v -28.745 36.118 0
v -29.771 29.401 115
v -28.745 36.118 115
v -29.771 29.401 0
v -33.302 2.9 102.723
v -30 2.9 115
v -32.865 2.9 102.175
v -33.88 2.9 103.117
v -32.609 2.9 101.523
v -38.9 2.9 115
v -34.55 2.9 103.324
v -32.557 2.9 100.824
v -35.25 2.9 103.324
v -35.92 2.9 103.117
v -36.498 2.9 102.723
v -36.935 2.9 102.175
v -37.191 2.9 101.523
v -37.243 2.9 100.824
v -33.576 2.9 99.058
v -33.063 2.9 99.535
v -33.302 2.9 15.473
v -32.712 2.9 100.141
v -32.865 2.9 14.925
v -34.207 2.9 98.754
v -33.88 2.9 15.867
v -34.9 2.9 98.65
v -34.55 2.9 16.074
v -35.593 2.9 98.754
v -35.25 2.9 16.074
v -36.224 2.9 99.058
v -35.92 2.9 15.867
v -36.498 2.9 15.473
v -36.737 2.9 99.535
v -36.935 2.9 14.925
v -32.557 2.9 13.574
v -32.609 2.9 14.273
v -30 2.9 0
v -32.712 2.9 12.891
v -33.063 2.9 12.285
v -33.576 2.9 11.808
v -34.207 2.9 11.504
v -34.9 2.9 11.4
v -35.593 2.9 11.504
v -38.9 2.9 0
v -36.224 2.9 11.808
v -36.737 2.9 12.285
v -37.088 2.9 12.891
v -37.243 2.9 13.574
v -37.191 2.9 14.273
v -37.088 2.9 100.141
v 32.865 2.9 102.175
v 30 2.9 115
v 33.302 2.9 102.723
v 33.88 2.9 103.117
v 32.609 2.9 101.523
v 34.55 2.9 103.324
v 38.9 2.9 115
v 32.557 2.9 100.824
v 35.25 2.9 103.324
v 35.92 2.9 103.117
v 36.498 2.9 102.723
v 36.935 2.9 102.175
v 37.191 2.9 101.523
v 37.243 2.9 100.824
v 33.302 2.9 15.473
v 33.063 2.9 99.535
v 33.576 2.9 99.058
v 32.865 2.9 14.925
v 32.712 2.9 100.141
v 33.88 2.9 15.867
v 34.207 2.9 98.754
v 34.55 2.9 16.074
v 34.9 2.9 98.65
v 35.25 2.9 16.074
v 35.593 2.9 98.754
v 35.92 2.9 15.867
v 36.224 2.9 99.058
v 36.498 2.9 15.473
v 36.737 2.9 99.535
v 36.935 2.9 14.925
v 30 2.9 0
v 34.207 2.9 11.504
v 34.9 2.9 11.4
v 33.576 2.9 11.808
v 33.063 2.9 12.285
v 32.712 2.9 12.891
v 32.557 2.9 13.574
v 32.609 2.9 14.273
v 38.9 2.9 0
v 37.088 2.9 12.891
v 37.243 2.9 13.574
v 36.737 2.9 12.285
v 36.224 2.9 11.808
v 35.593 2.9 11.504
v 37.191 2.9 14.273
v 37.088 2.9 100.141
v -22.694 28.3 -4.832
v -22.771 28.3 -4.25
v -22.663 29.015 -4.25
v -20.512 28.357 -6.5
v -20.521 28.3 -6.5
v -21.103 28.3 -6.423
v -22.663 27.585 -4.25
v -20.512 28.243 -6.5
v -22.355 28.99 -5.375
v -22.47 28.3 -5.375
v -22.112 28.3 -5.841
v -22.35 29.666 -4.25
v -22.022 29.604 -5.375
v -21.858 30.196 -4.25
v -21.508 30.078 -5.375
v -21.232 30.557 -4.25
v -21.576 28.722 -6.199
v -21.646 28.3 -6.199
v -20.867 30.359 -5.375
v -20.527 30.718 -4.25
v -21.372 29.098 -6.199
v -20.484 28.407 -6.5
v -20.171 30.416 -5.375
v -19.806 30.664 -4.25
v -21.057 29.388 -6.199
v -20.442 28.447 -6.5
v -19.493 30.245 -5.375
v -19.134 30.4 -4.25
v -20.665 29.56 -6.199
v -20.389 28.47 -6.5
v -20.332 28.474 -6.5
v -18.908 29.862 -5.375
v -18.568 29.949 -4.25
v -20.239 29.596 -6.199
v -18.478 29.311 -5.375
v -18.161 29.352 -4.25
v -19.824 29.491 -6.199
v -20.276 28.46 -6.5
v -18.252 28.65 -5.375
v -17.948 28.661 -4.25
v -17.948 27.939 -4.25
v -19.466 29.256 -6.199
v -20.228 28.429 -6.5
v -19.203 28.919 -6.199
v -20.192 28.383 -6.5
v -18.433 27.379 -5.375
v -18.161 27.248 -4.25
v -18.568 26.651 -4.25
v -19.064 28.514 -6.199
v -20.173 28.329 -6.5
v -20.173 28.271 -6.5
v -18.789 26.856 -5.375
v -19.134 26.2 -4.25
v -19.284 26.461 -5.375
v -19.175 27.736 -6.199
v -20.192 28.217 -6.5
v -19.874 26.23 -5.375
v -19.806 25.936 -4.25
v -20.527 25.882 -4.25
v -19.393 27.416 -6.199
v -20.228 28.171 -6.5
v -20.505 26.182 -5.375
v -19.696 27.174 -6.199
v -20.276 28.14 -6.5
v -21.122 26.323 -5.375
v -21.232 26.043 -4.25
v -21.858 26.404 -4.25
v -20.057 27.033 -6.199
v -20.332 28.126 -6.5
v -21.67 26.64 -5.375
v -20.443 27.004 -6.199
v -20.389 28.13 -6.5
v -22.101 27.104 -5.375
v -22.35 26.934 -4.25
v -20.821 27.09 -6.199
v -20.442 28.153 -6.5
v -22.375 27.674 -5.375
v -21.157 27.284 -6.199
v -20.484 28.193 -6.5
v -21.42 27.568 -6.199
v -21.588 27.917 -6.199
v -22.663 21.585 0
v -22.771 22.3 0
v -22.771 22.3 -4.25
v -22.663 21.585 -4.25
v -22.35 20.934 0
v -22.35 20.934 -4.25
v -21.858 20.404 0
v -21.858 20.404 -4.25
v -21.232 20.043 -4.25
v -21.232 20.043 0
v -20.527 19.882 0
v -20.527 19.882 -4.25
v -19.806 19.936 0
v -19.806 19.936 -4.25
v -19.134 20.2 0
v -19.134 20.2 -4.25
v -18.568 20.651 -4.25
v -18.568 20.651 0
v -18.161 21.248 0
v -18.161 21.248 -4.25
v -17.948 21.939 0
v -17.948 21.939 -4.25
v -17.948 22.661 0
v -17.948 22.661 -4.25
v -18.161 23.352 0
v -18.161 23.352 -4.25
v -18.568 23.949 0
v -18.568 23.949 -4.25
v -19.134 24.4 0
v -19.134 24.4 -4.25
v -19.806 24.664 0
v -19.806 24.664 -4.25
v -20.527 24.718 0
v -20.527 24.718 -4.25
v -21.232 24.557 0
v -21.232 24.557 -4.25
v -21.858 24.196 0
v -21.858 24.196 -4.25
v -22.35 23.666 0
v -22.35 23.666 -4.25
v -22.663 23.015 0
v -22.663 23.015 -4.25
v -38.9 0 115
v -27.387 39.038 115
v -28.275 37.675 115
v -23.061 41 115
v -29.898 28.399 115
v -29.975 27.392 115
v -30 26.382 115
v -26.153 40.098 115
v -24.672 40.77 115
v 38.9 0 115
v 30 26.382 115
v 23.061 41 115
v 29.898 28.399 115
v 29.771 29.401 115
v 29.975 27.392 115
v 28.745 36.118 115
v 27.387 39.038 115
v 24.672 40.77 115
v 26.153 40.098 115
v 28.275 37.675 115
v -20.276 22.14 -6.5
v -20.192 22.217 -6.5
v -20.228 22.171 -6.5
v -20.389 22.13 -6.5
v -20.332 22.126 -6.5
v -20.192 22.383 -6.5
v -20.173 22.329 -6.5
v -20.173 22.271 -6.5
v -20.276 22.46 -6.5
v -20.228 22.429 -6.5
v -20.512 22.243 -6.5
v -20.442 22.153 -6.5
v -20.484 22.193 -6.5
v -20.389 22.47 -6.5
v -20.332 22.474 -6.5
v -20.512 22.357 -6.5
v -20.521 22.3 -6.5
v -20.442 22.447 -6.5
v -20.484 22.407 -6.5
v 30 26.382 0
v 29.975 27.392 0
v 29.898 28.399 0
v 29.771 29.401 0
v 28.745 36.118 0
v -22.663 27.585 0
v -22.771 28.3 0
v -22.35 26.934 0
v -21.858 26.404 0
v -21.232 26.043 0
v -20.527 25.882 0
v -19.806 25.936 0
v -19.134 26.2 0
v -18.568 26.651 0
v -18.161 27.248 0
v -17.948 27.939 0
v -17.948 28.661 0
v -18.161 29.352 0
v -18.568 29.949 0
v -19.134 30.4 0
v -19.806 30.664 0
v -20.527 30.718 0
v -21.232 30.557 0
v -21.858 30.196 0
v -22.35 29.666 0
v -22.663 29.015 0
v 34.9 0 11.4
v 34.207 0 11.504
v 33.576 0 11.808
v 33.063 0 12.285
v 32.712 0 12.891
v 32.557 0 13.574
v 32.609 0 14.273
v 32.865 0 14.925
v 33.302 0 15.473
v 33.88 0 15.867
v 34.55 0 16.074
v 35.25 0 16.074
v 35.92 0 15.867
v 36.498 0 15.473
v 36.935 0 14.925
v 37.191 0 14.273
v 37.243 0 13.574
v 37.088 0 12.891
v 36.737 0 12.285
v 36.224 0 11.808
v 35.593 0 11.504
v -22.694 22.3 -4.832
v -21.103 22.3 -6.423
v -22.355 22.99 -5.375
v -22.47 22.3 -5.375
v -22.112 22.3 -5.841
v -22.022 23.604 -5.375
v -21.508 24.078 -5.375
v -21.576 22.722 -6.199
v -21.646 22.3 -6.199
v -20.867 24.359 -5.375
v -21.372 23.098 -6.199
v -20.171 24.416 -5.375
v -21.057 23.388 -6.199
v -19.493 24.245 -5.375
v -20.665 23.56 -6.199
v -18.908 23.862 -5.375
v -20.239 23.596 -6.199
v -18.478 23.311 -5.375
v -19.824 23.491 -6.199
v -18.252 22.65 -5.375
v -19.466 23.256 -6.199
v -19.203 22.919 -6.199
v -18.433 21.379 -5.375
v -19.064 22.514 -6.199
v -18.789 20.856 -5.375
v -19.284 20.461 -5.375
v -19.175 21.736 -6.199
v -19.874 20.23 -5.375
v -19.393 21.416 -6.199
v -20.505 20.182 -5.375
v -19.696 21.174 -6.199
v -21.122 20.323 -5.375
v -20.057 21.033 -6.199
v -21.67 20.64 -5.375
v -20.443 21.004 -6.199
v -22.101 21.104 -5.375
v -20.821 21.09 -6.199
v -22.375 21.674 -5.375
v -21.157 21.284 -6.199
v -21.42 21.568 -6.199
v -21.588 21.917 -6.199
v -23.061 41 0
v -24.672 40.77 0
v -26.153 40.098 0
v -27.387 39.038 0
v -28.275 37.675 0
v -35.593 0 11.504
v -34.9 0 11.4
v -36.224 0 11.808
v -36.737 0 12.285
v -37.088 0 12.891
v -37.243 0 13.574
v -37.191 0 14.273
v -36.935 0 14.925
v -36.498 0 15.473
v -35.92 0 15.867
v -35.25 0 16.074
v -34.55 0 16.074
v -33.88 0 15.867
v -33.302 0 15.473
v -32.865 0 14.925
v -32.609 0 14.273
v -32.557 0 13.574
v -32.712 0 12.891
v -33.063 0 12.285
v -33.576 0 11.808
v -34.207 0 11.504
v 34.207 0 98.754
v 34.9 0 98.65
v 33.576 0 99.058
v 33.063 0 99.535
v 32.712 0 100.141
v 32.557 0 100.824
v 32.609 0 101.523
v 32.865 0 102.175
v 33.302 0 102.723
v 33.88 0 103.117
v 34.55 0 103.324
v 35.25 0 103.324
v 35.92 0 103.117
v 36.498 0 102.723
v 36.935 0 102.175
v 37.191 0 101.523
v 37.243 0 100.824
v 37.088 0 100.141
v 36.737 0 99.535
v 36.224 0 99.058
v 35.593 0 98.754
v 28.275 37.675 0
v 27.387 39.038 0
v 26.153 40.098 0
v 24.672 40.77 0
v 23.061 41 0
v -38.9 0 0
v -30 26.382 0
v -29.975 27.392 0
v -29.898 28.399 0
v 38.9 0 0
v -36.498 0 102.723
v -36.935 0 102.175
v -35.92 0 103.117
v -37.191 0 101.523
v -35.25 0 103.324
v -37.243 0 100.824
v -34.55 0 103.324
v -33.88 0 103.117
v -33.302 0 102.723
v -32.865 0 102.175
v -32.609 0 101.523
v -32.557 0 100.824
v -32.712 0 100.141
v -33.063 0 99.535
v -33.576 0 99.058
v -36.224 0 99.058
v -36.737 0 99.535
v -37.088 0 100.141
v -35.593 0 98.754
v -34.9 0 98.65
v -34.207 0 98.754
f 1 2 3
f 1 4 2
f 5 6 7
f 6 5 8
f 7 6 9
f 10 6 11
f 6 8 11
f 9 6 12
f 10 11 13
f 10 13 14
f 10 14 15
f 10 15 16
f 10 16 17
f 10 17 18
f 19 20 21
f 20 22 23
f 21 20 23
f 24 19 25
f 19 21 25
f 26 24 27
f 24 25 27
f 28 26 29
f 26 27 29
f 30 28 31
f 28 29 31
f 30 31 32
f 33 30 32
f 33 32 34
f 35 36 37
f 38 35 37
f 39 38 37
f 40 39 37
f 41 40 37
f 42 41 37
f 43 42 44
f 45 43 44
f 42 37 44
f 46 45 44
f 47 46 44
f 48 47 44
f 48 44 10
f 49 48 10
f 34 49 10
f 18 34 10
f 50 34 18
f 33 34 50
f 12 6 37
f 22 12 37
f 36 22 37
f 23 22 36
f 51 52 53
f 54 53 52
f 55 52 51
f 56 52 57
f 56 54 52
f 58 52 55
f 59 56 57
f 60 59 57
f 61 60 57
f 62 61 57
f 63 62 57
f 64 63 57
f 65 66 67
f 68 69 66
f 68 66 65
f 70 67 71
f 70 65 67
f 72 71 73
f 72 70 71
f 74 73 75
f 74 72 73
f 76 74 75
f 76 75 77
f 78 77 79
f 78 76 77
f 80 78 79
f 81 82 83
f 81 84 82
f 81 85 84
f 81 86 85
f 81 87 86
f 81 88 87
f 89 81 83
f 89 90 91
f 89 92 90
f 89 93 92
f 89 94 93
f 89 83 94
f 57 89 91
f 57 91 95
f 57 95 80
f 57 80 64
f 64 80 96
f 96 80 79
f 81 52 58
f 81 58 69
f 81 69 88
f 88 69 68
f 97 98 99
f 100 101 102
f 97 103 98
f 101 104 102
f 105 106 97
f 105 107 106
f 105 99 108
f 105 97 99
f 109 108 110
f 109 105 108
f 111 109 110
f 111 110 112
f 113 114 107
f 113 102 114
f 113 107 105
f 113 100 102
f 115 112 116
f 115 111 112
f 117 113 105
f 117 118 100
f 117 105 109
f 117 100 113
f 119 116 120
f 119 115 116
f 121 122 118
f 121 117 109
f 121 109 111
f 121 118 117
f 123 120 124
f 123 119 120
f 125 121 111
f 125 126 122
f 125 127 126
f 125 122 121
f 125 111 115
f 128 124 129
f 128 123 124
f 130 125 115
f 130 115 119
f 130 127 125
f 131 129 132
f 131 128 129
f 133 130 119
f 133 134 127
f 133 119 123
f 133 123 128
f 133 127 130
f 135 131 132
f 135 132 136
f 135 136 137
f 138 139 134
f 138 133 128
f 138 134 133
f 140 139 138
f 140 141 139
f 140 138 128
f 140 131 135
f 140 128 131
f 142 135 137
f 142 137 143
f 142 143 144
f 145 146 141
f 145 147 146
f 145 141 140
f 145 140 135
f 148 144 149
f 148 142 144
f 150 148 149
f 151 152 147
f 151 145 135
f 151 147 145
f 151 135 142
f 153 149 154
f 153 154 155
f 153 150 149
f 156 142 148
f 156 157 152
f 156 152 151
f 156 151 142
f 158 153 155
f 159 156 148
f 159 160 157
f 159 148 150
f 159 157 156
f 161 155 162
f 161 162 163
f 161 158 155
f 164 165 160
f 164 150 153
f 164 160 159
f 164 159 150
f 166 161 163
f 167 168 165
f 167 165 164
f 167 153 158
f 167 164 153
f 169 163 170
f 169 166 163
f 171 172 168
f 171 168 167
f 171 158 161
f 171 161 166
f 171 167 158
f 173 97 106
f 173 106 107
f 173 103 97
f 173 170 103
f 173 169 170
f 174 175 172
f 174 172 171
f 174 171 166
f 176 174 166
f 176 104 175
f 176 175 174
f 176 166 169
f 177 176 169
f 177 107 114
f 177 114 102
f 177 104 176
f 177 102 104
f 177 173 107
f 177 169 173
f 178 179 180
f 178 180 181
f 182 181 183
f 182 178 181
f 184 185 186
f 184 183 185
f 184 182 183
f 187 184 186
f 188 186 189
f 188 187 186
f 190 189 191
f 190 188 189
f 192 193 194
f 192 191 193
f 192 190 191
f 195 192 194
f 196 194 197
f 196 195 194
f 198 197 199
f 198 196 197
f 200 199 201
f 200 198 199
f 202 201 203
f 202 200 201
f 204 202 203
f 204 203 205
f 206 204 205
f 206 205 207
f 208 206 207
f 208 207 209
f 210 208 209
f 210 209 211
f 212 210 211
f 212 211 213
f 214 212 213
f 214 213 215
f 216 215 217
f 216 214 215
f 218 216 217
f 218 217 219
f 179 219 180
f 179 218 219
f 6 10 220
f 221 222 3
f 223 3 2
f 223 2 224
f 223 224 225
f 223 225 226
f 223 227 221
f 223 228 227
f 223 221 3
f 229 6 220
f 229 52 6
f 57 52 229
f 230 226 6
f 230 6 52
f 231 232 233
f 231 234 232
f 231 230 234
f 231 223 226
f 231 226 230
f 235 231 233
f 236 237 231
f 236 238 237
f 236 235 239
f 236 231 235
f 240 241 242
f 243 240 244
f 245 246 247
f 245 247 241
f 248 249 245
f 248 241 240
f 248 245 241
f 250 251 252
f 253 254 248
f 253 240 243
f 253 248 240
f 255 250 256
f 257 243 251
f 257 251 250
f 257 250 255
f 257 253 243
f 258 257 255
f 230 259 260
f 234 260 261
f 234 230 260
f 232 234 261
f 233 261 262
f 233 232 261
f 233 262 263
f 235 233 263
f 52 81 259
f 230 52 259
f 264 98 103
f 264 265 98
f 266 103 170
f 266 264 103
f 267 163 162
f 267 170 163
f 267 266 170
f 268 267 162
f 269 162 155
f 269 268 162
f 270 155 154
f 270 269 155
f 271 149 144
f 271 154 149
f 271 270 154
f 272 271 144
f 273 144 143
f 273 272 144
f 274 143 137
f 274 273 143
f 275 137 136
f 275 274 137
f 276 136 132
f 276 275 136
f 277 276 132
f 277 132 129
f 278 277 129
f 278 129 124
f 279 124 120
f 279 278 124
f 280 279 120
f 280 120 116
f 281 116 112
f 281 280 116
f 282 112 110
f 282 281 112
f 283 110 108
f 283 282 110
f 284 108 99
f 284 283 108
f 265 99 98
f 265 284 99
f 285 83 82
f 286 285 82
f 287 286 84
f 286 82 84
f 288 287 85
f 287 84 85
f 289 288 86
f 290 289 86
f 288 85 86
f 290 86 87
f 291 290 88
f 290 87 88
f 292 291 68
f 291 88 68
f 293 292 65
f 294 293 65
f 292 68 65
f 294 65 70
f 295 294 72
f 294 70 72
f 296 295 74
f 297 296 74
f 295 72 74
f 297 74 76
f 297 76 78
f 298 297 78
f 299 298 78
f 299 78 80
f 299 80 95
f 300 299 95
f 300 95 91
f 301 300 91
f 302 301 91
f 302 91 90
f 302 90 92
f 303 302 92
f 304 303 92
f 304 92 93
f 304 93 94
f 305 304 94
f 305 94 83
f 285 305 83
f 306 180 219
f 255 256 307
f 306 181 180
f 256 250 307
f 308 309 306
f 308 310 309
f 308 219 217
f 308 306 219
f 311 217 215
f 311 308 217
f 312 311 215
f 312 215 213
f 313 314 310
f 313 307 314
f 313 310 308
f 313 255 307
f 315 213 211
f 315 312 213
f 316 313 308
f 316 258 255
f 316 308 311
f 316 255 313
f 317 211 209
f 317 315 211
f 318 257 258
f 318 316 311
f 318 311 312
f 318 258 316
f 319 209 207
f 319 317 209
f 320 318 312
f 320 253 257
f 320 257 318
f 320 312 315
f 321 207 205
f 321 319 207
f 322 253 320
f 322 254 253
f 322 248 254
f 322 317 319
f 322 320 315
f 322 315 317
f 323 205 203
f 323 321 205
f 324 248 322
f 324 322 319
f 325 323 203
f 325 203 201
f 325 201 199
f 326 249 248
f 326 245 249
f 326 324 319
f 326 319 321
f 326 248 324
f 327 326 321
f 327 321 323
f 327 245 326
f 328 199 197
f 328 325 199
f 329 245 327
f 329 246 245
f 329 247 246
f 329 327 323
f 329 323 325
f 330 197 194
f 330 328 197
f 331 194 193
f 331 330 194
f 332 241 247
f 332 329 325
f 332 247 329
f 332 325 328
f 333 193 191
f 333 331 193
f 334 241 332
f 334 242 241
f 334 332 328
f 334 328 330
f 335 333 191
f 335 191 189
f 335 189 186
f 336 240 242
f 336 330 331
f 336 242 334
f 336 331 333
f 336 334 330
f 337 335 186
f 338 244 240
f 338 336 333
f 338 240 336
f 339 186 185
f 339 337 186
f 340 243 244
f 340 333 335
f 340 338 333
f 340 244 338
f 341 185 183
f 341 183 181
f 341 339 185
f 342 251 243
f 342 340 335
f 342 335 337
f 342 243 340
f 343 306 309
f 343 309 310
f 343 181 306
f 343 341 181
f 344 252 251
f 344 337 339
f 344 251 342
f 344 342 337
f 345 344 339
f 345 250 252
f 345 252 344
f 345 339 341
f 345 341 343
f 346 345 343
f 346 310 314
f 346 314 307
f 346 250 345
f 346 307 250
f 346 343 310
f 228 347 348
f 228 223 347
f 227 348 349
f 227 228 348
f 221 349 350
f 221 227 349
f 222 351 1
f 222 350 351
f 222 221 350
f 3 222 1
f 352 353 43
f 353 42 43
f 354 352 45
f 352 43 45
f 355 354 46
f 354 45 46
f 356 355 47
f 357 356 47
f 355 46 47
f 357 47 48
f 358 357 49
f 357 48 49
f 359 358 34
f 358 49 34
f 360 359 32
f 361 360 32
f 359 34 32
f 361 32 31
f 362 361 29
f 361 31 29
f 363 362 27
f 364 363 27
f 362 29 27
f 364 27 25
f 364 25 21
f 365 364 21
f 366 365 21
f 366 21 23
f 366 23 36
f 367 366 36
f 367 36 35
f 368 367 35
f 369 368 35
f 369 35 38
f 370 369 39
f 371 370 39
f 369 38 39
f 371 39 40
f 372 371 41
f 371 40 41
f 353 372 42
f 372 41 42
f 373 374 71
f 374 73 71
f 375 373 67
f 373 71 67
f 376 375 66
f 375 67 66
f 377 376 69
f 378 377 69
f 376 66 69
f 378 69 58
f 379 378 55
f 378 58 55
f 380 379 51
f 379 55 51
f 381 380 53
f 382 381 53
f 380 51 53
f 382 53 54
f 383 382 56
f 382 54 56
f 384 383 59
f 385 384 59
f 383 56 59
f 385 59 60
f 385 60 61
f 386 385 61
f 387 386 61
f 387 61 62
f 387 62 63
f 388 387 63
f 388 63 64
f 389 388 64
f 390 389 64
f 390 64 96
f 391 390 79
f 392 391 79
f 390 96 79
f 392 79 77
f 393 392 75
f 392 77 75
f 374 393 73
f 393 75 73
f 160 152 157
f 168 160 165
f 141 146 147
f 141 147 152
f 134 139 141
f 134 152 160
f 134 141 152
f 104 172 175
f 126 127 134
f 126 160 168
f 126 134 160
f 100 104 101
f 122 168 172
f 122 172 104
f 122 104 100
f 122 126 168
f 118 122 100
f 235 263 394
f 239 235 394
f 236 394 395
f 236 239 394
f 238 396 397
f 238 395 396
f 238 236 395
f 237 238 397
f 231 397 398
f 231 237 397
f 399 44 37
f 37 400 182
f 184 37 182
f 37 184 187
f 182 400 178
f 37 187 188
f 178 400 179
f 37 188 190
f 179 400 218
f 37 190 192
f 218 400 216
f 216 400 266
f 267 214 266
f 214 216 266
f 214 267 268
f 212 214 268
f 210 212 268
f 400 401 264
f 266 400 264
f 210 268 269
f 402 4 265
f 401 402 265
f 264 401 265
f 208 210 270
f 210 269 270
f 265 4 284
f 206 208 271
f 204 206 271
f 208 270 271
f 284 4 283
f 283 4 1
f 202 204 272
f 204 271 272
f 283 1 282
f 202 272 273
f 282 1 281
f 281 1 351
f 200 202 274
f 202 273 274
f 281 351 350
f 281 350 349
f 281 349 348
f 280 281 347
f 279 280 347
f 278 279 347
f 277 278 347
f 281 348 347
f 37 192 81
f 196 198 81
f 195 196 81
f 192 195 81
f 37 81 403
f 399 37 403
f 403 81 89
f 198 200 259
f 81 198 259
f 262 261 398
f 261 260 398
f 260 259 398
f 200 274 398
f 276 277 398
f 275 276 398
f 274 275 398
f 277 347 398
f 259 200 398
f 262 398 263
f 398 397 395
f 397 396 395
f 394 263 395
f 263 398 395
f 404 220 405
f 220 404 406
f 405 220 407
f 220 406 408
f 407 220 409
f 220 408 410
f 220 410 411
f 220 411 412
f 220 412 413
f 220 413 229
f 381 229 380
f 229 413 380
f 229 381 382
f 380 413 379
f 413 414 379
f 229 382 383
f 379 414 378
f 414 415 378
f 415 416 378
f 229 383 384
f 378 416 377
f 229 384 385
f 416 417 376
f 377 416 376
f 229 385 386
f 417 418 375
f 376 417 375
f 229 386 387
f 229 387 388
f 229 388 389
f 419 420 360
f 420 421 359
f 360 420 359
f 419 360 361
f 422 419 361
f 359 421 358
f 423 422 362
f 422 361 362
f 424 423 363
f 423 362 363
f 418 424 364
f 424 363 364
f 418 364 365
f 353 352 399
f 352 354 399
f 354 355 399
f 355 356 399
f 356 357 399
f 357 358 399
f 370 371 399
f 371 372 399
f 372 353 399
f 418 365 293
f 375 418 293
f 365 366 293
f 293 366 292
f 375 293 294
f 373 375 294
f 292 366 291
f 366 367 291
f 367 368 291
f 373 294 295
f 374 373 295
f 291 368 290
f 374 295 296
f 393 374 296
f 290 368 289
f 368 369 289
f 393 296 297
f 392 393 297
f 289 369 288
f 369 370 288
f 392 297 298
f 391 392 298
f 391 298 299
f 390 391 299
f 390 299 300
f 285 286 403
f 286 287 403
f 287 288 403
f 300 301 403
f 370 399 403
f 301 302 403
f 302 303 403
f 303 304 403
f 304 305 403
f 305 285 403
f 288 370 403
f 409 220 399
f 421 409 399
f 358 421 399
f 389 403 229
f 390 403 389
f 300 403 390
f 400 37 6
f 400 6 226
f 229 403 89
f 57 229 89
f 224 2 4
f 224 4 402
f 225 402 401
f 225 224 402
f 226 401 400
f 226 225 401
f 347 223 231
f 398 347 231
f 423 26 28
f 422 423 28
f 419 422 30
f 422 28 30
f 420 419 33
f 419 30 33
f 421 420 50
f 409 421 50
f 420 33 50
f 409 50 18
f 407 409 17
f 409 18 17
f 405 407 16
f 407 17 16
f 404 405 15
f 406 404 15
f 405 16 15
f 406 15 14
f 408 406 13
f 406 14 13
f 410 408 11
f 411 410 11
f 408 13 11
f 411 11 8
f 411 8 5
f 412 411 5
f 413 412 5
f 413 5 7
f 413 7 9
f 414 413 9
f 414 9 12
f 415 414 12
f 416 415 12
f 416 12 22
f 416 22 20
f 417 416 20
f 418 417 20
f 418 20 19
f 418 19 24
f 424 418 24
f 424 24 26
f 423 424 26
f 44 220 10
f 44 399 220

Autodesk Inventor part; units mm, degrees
ref_plane "YZ Plane" through (0, 0, 0) normal (1, 0, 0) x (0, 1, 0)
ref_plane "XZ Plane" through (0, 0, 0) normal (0, 1, 0) x (-1, 0, 0)
ref_plane "XY Plane" through (0, 0, 0) normal (0, 0, 1) x (1, 0, 0)
sketch "Sketch1" plane through (0, 0, 0) normal (0, 0, 1) x (1, 0, 0)
  line L0 (-38.9, 0) -> (38.9, 0)
  line L1 (-38.9, 0) -> (-38.9, 2.9)
  line L2 (38.9, 0) -> (38.9, 2.9)
  line L3 (-30, 2.9) -> (-38.9, 2.9)
  line L4 (30, 2.9) -> (38.9, 2.9)
  line L5 (30, 2.9) -> (30, 27.9)
  line L6 (-30, 2.9) -> (-30, 27.9)
  line L7 (-30, 27.9) -> (30, 27.9) construction
  line L8 (-28, 41) -> (28, 41)
  line L9 (-30, 27.9) -> (-28, 41)
  line L10 (30, 27.9) -> (28, 41)
  point P0 (0, 0)
  point P1 (0, 0)
  point P2 (0, 27.9)
  point P3 (0, 41)
  dimension "d0" = 77.8
  dimension "d1" = 2.9
  dimension "d6" = 25
  dimension "d7" = 56
  dimension "d8" = 41
extrude "Extrusion1" add sketch "Sketch1" along normal blind 115
fillet "Fillet1" radius 5.75 2 edges at (28, 41, 57.5) (-28, 41, 57.5)
fillet "Fillet2" radius 20 2 edges at (-30, 27.9, 57.5) (30, 27.9, 57.5)
sketch "Sketch2" plane through (-38.9, 0, 0) normal (0, -1, 0) x (1, 0, 0)
  line L0 (0, 0) -> (77.8, 0) projected
  line L1 (0, 0) -> (0, 115) projected
  line L2 (77.8, 0) -> (77.8, 115) projected
  line L3 (0, 115) -> (77.8, 115) projected
  point P0 (38.9, 0)
  point P1 (4, 13.75)
  point P2 (73.8, 13.75)
  point P3 (4, 101)
  point P4 (73.8, 101)
  dimension "d11" = 13.75
  dimension "d12" = 4
  dimension "d13" = 4
  dimension "d14" = 14
hole "Hole1" at (-34.9, 0, 13.75) at (34.9, 0, 13.75) at (-34.9, 0, 101) at (34.9, 0, 101) direction (0, 1, 0) diameter 4.7 end through all
sketch "Sketch3" plane through (0, 0, 0) normal (0, 0, -1) x (-1, 0, 0)
  circle A0 centre (20.3461, 28.3) radius 2.425
  circle A1 centre (20.3461, 22.3) radius 2.425
  line L0 (-23.0612, 41) -> (23.0612, 41) projected
  point P0 (0, 0)
  dimension "d22" = 4.85
  dimension "d23" = 4.85
  dimension "d24" = 6
  dimension "d25" = 12.7
extrude "Extrusion2" add sketch "Sketch3" along normal blind 6.5
fillet "Fillet3" radius 2.25 2 edges at (-17.9211, 28.3, -6.5) (-17.9211, 22.3, -6.5)
equation "\"d13\" = d12"
equation "\"d23\" = d22"
properties part number "KellyController-KBS-Small"
